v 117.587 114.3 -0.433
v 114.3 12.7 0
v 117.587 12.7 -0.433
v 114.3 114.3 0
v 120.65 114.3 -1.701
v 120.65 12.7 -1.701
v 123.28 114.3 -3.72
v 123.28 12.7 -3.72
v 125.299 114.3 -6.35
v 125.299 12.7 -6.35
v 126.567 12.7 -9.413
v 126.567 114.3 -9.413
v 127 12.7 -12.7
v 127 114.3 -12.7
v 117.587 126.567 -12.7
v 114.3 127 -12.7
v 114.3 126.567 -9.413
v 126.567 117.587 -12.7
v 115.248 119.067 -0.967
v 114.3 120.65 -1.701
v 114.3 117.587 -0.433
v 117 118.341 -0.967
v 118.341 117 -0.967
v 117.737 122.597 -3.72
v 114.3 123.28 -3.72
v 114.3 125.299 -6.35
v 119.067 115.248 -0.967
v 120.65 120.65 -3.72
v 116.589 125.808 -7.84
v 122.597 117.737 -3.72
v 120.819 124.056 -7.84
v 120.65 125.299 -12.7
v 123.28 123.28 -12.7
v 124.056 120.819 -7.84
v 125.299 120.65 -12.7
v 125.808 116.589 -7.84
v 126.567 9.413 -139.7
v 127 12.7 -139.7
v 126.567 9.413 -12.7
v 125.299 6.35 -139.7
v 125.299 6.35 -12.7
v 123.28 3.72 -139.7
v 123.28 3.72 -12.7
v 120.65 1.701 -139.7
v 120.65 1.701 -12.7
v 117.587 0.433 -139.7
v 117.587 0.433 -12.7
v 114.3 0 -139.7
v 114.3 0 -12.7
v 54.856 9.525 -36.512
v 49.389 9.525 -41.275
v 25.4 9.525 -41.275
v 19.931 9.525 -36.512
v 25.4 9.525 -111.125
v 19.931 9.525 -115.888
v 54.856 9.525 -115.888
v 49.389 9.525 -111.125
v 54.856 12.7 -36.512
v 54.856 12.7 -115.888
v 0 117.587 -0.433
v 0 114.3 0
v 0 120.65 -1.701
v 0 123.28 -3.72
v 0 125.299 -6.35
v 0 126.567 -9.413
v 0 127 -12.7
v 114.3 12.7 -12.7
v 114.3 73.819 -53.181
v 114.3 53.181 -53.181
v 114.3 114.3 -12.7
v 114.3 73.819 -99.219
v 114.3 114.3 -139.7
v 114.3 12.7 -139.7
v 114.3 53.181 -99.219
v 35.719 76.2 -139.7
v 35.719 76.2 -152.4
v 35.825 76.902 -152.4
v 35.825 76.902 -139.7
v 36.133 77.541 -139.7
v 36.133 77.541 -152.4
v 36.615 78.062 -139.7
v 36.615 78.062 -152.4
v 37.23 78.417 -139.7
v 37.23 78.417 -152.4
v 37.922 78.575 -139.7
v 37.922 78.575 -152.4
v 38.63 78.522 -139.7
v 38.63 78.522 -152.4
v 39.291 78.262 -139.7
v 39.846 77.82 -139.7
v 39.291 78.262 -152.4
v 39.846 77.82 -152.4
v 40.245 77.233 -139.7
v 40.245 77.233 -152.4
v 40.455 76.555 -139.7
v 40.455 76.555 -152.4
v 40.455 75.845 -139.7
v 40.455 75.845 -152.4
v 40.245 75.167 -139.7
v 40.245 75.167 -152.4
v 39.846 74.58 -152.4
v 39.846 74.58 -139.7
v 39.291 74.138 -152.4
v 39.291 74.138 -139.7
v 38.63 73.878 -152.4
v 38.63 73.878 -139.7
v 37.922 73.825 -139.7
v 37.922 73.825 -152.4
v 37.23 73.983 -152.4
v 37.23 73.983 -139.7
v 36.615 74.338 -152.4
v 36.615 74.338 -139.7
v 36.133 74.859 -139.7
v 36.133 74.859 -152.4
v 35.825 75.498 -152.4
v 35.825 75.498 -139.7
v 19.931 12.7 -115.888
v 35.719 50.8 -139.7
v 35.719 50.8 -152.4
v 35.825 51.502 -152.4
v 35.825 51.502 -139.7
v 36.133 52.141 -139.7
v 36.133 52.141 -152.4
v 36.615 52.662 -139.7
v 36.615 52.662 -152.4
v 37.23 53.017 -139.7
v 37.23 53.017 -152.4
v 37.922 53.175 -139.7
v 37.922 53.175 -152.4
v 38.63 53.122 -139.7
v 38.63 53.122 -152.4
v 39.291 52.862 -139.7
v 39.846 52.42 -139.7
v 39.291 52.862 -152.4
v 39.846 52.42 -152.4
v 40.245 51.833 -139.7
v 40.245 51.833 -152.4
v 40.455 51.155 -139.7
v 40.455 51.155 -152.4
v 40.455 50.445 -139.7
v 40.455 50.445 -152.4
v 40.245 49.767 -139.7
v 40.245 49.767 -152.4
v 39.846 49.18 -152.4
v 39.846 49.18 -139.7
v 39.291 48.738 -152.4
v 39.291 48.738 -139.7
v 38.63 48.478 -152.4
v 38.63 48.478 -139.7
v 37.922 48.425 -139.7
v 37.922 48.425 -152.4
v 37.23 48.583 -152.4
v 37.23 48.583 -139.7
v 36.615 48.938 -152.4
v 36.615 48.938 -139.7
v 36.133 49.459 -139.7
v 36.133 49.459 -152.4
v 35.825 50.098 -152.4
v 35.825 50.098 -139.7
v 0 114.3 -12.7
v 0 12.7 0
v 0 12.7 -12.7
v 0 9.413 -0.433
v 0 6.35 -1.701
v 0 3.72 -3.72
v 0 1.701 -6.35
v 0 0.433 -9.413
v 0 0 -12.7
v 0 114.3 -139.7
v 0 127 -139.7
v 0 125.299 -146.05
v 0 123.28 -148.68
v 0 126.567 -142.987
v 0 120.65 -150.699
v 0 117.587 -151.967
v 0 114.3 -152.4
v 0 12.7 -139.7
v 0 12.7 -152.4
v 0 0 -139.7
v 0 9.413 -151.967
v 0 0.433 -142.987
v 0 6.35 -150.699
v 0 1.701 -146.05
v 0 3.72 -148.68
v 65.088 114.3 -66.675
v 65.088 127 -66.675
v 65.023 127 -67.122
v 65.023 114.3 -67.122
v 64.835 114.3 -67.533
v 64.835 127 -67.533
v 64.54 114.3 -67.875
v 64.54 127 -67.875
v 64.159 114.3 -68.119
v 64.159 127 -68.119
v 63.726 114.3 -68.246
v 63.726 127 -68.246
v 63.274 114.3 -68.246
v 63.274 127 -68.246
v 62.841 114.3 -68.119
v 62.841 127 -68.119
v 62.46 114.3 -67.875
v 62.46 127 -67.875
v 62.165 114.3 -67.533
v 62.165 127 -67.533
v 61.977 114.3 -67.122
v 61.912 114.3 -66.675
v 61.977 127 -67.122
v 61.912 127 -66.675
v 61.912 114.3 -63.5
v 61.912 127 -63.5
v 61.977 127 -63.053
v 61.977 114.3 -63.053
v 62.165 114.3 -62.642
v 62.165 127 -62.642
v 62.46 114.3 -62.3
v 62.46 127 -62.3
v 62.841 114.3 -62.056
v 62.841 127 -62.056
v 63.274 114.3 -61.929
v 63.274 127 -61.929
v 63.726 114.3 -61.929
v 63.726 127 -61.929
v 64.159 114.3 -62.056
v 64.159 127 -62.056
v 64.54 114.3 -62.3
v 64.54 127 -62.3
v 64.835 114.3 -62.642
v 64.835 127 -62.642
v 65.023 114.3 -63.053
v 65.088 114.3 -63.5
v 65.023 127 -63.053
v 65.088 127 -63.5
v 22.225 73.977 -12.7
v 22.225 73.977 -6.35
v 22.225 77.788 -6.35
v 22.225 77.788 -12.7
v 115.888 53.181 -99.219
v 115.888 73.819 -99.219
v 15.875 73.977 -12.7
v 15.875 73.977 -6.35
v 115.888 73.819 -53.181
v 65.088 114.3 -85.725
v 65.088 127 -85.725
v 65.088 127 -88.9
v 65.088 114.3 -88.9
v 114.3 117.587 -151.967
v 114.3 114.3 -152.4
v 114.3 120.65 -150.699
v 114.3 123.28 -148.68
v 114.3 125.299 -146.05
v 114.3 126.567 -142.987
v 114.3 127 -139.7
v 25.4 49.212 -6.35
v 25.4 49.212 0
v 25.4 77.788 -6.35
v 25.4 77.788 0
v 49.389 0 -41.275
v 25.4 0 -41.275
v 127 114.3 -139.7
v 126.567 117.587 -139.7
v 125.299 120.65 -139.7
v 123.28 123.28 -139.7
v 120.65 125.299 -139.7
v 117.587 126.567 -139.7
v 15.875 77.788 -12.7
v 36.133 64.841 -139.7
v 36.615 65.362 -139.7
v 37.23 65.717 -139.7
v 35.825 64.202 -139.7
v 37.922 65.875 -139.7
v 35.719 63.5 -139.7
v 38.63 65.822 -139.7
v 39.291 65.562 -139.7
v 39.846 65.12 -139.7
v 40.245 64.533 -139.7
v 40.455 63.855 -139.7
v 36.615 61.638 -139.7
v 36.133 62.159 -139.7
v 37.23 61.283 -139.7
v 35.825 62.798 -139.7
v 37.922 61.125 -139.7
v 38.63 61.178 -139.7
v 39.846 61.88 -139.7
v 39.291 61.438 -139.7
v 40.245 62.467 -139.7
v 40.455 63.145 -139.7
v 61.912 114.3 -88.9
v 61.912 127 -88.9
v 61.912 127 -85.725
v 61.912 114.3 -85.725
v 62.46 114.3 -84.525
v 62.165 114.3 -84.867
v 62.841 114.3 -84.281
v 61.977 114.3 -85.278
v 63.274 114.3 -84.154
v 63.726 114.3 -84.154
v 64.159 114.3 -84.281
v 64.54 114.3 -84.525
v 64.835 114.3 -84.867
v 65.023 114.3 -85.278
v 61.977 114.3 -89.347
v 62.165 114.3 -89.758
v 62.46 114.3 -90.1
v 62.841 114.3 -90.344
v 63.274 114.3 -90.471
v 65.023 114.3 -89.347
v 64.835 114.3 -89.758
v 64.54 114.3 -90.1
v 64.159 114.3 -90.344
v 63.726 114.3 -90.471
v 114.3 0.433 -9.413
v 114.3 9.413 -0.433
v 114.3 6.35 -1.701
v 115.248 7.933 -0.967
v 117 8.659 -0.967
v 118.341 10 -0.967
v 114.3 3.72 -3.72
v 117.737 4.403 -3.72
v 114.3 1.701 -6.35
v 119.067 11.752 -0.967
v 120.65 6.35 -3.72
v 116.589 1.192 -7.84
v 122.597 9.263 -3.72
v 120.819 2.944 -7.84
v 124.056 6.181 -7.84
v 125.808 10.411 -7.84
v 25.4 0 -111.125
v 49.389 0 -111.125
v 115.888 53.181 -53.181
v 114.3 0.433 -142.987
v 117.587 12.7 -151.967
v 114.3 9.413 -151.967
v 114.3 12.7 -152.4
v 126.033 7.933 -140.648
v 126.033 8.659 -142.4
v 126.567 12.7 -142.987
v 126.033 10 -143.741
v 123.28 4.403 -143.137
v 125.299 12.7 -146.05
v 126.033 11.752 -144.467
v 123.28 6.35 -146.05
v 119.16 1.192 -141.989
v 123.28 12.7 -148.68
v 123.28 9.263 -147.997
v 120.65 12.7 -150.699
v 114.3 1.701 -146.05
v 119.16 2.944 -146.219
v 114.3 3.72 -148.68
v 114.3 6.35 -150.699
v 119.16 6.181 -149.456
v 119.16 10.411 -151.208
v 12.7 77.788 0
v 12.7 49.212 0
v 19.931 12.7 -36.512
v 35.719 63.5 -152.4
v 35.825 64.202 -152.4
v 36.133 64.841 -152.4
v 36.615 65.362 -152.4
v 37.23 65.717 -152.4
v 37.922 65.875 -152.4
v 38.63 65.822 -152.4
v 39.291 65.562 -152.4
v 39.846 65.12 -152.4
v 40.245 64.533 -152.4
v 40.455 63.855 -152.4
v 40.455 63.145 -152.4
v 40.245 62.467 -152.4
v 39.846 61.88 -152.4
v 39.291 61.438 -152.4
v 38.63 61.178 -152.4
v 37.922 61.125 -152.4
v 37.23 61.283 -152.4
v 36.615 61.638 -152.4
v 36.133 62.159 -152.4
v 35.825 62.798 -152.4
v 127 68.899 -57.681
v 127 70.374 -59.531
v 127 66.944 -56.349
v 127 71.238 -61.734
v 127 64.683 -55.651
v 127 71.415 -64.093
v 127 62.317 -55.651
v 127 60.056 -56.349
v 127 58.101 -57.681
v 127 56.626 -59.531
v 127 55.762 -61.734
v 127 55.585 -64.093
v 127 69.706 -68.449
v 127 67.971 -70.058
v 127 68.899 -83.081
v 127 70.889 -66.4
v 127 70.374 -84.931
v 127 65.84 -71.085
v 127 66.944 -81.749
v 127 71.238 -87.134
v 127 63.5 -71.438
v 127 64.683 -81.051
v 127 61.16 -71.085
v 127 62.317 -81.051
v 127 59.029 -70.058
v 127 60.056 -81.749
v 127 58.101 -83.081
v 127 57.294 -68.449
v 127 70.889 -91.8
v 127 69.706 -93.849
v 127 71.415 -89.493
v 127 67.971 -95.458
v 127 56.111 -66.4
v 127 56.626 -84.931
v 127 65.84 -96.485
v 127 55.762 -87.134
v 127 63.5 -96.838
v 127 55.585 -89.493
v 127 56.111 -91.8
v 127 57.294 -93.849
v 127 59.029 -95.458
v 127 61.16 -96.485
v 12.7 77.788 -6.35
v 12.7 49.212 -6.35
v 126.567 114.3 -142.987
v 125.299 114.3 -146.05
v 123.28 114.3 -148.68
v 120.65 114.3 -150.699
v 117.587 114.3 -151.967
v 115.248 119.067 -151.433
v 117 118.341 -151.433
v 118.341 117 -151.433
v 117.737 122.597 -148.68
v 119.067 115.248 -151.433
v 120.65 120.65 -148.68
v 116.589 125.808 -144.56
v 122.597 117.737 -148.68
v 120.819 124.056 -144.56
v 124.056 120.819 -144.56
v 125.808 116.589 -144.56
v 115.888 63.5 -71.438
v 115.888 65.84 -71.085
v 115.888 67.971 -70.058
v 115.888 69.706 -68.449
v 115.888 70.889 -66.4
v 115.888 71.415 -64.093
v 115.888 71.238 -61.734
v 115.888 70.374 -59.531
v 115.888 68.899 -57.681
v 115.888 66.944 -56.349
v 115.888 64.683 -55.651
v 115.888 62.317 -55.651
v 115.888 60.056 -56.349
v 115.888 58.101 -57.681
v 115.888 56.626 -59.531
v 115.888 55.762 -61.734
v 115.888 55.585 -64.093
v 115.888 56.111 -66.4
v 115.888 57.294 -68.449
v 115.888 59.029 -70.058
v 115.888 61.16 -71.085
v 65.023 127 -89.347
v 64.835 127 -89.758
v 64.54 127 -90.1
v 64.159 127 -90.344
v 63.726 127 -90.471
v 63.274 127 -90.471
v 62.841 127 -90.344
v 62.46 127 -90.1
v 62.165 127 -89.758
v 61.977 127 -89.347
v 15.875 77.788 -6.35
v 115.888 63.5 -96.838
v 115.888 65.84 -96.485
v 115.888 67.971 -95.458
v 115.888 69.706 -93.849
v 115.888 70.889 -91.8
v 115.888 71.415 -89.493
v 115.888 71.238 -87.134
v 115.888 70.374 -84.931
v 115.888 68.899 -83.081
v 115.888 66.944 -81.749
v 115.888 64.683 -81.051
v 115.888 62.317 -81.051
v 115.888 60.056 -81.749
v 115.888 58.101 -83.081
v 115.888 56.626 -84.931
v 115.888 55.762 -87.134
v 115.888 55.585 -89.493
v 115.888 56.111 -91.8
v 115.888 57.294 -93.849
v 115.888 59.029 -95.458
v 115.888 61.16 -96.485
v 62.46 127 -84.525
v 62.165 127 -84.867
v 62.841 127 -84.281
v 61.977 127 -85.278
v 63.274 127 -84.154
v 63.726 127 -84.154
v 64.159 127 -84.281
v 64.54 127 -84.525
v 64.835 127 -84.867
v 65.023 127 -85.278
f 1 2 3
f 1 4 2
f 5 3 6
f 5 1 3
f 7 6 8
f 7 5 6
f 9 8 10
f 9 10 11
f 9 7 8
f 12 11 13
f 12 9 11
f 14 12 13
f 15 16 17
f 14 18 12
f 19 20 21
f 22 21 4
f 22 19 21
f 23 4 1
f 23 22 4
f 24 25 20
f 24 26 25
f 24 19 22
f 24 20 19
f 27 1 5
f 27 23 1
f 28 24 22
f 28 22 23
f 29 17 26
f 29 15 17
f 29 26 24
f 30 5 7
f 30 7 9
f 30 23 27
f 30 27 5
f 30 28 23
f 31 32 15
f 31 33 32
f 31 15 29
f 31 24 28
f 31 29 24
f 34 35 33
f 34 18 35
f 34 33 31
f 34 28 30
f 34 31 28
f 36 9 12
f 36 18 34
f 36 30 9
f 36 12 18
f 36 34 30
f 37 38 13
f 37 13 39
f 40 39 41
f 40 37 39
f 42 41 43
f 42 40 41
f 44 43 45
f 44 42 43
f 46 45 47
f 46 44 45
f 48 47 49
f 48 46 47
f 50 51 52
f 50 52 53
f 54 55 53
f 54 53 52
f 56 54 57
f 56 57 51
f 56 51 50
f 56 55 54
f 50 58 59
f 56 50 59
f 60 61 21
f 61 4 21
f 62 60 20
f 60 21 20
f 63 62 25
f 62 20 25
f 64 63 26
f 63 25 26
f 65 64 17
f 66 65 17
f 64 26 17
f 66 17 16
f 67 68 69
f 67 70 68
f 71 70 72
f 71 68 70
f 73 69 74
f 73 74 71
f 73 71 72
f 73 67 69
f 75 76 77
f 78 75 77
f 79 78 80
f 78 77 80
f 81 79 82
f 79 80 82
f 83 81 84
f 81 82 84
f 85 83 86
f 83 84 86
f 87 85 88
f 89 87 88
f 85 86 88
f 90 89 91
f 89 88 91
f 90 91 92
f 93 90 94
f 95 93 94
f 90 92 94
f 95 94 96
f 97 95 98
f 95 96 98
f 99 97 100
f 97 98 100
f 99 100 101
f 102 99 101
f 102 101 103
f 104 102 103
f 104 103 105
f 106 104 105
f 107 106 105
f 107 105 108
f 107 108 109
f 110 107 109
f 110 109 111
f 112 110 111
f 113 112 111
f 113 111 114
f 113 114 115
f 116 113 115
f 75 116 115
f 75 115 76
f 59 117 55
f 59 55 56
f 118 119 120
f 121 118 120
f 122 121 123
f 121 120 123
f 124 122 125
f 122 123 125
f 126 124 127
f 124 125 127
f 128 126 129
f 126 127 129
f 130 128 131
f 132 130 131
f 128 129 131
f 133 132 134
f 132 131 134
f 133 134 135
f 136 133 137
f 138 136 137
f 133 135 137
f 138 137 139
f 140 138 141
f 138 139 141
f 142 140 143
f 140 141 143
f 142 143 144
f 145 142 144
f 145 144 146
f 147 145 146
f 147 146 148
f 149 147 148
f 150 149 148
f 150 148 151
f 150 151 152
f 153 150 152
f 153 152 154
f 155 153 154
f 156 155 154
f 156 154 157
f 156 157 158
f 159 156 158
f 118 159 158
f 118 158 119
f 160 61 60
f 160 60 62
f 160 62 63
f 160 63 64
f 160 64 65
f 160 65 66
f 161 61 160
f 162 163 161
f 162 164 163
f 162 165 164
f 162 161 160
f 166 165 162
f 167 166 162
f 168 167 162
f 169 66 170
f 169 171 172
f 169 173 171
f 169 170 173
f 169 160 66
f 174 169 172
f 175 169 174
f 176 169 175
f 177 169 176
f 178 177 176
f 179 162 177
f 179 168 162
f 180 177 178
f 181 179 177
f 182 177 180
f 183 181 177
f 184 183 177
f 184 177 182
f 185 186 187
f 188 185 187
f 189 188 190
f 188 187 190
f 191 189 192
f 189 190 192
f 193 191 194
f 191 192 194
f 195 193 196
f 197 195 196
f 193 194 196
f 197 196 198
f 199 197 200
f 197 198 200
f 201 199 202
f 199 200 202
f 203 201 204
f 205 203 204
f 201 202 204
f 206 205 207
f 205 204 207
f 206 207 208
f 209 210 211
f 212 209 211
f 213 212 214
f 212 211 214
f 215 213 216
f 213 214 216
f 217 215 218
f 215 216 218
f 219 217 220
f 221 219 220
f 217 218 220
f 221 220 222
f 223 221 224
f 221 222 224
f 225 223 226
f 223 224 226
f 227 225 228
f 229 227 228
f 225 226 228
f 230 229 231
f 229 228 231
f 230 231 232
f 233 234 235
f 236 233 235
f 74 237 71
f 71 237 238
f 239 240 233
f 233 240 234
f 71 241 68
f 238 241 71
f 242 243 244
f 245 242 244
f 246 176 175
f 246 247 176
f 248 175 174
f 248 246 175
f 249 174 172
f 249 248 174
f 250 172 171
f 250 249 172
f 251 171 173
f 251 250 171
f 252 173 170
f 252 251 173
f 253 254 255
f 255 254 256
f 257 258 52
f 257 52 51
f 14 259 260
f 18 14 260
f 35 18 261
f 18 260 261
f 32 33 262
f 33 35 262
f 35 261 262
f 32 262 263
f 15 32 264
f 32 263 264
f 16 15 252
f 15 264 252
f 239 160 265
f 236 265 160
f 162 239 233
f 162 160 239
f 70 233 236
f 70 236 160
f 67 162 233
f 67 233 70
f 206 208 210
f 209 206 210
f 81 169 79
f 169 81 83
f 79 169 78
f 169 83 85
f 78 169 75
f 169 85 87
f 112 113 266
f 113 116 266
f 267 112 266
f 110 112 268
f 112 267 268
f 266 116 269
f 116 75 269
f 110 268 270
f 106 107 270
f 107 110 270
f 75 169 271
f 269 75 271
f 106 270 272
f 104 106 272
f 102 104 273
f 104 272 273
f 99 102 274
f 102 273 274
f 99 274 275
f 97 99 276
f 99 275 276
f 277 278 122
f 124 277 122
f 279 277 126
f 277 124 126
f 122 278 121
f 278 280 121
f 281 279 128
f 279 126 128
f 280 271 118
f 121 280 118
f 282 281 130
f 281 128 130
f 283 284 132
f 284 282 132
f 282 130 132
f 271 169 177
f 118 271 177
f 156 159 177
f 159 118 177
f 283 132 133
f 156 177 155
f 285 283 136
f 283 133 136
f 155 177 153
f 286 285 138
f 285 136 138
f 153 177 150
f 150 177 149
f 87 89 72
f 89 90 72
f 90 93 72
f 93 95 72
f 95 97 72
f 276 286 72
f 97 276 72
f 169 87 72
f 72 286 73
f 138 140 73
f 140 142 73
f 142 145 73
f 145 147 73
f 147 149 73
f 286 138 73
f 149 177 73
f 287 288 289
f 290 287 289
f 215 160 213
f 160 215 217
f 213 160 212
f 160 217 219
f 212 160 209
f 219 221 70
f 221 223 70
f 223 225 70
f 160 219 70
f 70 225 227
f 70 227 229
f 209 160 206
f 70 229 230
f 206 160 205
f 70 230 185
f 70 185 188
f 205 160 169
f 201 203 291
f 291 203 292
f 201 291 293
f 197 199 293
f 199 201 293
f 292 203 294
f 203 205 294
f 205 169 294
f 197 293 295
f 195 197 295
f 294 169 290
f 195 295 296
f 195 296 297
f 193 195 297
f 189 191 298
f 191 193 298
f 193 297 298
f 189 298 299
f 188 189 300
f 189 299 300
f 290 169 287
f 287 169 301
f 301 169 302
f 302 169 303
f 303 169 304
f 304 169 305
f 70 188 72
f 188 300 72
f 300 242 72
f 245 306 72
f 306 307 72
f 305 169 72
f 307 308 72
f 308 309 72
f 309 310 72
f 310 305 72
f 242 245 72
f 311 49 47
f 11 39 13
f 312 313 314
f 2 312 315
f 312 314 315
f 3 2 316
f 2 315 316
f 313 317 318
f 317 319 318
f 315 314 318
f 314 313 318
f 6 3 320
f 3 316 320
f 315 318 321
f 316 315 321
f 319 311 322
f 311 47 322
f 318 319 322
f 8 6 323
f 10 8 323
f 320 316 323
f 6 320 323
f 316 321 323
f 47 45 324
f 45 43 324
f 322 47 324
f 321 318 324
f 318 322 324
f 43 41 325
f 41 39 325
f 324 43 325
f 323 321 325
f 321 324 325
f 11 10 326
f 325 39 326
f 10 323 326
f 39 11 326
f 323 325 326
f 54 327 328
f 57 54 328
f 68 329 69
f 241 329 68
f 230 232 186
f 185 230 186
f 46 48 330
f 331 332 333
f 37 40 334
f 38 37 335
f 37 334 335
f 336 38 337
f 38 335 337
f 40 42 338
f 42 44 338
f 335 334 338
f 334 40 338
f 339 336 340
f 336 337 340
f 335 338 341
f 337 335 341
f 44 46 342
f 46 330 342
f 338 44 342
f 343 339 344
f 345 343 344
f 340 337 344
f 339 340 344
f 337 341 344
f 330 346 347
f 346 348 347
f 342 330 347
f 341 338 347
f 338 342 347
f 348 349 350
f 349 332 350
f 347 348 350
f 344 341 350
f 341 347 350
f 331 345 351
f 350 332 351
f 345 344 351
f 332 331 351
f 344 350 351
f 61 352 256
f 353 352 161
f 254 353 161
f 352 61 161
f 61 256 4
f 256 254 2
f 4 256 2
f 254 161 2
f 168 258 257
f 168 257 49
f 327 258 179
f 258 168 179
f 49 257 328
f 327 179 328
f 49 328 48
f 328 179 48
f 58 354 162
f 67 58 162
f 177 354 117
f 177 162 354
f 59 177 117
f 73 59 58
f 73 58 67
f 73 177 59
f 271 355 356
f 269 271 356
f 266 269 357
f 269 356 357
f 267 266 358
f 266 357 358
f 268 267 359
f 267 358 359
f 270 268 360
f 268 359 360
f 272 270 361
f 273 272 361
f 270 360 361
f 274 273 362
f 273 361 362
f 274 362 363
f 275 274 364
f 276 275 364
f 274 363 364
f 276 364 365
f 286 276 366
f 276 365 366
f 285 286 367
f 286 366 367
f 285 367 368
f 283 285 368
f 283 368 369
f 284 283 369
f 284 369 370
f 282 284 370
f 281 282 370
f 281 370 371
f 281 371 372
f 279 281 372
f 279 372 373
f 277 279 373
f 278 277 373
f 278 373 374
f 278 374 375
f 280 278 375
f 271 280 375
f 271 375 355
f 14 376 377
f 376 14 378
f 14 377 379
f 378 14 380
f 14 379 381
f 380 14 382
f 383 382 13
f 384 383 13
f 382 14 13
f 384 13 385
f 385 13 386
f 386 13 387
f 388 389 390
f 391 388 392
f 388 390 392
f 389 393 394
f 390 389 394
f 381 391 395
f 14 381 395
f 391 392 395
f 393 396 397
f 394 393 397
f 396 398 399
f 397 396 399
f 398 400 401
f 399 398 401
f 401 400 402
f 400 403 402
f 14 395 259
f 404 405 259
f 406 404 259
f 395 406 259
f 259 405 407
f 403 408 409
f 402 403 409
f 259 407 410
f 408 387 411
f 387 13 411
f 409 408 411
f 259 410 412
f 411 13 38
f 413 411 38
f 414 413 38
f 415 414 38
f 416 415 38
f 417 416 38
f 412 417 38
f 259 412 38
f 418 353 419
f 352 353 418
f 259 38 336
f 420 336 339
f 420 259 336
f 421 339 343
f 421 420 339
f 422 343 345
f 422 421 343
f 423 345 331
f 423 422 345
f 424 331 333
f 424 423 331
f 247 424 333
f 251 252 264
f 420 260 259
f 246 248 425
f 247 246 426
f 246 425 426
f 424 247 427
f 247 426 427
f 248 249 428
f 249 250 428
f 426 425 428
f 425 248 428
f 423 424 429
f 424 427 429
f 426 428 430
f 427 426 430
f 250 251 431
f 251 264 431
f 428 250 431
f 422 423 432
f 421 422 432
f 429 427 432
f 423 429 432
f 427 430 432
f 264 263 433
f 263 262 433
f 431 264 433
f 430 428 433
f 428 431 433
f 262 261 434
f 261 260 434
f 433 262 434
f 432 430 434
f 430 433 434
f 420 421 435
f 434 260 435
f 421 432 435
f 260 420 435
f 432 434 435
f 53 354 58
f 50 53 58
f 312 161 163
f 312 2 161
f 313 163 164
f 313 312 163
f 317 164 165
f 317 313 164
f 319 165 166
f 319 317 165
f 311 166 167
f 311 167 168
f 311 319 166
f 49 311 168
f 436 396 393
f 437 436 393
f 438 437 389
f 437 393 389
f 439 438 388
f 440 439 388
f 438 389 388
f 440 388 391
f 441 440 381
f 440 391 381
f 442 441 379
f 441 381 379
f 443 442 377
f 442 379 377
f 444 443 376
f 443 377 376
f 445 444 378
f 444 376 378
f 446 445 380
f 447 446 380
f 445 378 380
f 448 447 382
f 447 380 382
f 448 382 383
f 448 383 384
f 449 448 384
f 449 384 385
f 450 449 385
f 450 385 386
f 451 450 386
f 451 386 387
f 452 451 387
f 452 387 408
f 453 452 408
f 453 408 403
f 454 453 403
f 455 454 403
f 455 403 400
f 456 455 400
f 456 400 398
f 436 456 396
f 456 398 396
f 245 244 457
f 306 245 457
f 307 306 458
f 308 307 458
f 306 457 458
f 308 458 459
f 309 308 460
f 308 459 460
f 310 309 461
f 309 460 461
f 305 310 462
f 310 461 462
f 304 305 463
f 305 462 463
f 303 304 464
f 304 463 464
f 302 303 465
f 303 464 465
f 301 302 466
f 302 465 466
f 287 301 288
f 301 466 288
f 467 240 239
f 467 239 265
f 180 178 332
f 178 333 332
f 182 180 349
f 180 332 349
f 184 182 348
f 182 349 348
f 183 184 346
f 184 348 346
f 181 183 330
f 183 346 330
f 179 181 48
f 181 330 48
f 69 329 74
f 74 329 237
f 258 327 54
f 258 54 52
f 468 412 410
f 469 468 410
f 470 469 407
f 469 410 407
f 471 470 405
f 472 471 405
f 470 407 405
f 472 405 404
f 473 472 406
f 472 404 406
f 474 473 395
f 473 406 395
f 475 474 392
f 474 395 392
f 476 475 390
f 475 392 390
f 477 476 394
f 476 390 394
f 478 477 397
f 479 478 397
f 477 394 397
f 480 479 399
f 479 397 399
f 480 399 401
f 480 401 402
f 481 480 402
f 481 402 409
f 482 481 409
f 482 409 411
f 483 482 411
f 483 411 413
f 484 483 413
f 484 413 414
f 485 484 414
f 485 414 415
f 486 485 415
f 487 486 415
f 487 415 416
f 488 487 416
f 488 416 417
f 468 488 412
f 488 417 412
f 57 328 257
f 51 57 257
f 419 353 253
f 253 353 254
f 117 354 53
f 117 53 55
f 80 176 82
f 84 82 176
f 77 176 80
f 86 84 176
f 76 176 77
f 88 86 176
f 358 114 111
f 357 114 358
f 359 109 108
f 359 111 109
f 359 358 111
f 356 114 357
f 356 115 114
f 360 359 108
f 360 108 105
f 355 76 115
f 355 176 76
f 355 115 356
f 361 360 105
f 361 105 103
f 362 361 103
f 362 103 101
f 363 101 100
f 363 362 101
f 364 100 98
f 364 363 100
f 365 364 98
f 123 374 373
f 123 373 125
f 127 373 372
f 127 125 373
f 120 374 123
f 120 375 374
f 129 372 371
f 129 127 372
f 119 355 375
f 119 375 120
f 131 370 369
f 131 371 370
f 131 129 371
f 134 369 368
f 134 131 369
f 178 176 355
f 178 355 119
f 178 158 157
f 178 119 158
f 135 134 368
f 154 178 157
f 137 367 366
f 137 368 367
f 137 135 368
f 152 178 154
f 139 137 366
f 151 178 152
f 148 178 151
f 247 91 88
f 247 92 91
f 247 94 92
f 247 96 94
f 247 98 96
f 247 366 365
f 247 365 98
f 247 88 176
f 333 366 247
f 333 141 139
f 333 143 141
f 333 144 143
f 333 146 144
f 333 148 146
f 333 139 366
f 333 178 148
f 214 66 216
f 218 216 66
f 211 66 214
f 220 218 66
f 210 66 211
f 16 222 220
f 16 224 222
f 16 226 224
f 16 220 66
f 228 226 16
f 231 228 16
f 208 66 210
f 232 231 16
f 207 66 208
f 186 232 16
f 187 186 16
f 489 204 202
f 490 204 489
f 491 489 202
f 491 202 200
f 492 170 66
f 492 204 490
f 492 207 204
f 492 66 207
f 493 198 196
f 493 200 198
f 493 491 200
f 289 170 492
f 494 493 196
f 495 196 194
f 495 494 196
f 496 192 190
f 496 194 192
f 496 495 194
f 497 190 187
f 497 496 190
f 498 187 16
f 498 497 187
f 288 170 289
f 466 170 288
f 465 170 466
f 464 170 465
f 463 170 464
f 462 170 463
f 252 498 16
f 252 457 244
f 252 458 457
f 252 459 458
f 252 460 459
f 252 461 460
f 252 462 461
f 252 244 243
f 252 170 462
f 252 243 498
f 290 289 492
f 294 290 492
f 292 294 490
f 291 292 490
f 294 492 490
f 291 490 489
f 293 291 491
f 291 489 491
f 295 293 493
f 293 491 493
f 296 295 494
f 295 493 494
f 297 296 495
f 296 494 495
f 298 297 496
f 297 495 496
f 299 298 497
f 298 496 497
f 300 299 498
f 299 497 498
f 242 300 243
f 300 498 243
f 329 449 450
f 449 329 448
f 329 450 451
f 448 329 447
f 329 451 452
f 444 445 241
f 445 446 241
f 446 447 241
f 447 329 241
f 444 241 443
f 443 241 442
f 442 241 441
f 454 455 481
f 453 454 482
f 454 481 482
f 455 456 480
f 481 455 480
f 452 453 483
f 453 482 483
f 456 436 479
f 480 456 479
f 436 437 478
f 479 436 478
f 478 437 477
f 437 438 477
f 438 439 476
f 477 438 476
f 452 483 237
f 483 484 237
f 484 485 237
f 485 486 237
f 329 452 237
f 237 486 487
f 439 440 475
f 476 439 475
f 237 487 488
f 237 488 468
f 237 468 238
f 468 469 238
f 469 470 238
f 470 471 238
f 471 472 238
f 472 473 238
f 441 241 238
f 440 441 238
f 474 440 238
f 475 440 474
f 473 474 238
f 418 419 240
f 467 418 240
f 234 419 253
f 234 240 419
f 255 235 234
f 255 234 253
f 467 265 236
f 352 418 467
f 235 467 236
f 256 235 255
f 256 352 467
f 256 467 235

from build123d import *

# Parameters (mm, degrees)
SKETCH1_W           = 127
SKETCH1_H           = 152.4
BOSS_EXTRUDE1_DEPTH = 127
SHELL1_T            = -12.7
FILLET1_R           = 12.7
SKETCH3_W           = 23.988888889
SKETCH3_H           = 69.85
CUT_EXTRUDE1_DEPTH  = 9.525
SKETCH4_W           = 34.925
SKETCH4_H           = 79.375
CUT_EXTRUDE2_DEPTH  = 3.175
SKETCH5_W           = 12.7
SKETCH5_H           = 28.575
CUT_EXTRUDE3_DEPTH  = 6.35
CUT_EXTRUDE4_REACH  = 233.492
SKETCH6_W           = 6.35
SKETCH6_H           = 3.81
SKETCH7_R           = 7.9375
CUT_EXTRUDE5_DEPTH  = 11.1125
CUT_EXTRUDE6_REACH  = 231.749
SKETCH8_W           = 46.0375
SKETCH8_H           = 20.6375
CUT_EXTRUDE7_REACH  = 237.55
SKETCH9_R           = 2.38125
CUT_EXTRUDE8_REACH  = 237.55


with BuildPart() as part:
    # Sketch1 → Boss-Extrude1 (new body)
    with BuildSketch(Plane(origin=(0, 0, 0), x_dir=(1, 0, 0), z_dir=(0, 1, 0))):
        with Locations((63.5, 76.2)):
            Rectangle(SKETCH1_W, SKETCH1_H)
    extrude(amount=BOSS_EXTRUDE1_DEPTH)

    # Shell1
    shell1_openings = [part.faces().sort_by_distance(p)[0] for p in [
        (0, 63.5, -76.2),
    ]]
    offset(amount=SHELL1_T, openings=shell1_openings, kind=Kind.INTERSECTION)

    # Fillet1
    fillet1_edges = [part.edges().sort_by_distance(p)[0] for p in [
        (127, 127, -76.2),
        (63.5, 127, -152.4),
        (63.5, 0, -152.4),
        (127, 0, -76.2),
        (63.5, 0, 0),
        (63.5, 127, 0),
        (127, 63.5, -152.4),
        (127, 63.5, 0),
    ]]
    fillet(fillet1_edges, radius=FILLET1_R)

    # Sketch3 → Cut-Extrude1 (cut)
    with BuildSketch(Plane.XZ):
        with Locations((37.394444445, -76.2)):
            Rectangle(SKETCH3_W, SKETCH3_H)
    extrude(amount=-CUT_EXTRUDE1_DEPTH, mode=Mode.SUBTRACT)

    # Sketch4 → Cut-Extrude2 (cut)
    with BuildSketch(Plane(origin=(0, 12.7, 0), x_dir=(1, 0, 0), z_dir=(0, 1, 0))):
        with Locations((37.39388, 76.2)):
            Rectangle(SKETCH4_W, SKETCH4_H)
    extrude(amount=-CUT_EXTRUDE2_DEPTH, mode=Mode.SUBTRACT)

    # Sketch5 → Cut-Extrude3 (cut)
    with BuildSketch(Plane.XY):
        with Locations((19.05, 63.5)):
            Rectangle(SKETCH5_W, SKETCH5_H)
    extrude(amount=-CUT_EXTRUDE3_DEPTH, mode=Mode.SUBTRACT)

    # Sketch6 → Cut-Extrude4 (cut, up to next)
    with BuildSketch(Plane.XY.offset(-6.35), mode=Mode.PRIVATE) as cut_extrude4_sk1:
        with Locations((19.05, 75.8825)):
            Rectangle(SKETCH6_W, SKETCH6_H)
    cut_extrude4_tool1 = extrude(cut_extrude4_sk1.sketch, amount=-CUT_EXTRUDE4_REACH, mode=Mode.PRIVATE) & part.part
    add(cut_extrude4_tool1.solids().sort_by_distance((19.05, 75.8825, -6.35))[0], mode=Mode.SUBTRACT)

    # Sketch7 → Cut-Extrude5 (cut)
    with BuildSketch(Plane(origin=(127, 0, 0), x_dir=(0, 0, -1), z_dir=(1, 0, 0))):
        with Locations((63.5, 63.5)):
            Circle(SKETCH7_R)
        with Locations((88.9, 63.5)):
            Circle(SKETCH7_R)
    extrude(amount=-CUT_EXTRUDE5_DEPTH, mode=Mode.SUBTRACT)

    # Sketch8 → Cut-Extrude6 (cut, up to next)
    with BuildSketch(Plane(origin=(115.8875, 0, 0), x_dir=(0, 0, -1), z_dir=(1, 0, 0)), mode=Mode.PRIVATE) as cut_extrude6_sk1:
        with Locations((76.2, 63.5)):
            Rectangle(SKETCH8_W, SKETCH8_H)
    cut_extrude6_tool1 = extrude(cut_extrude6_sk1.sketch, amount=-CUT_EXTRUDE6_REACH, mode=Mode.PRIVATE) & part.part
    add(cut_extrude6_tool1.solids().sort_by_distance((115.8875, 63.5, -76.2))[0], mode=Mode.SUBTRACT)

    # Sketch9 → Cut-Extrude7 (cut, up to next)
    with BuildSketch(Plane(origin=(0, 0, -152.4), x_dir=(-1, 0, 0), z_dir=(0, 0, -1)), mode=Mode.PRIVATE) as cut_extrude7_sk1:
        with Locations((-38.1, 76.2)):
            Circle(SKETCH9_R)
    cut_extrude7_tool1 = extrude(cut_extrude7_sk1.sketch, amount=-CUT_EXTRUDE7_REACH, mode=Mode.PRIVATE) & part.part
    # Sketch9 → Cut-Extrude7 (cut, up to next)
    with BuildSketch(Plane(origin=(0, 0, -152.4), x_dir=(-1, 0, 0), z_dir=(0, 0, -1)), mode=Mode.PRIVATE) as cut_extrude7_sk2:
        with Locations((-38.1, 63.5)):
            Circle(SKETCH9_R)
    cut_extrude7_tool2 = extrude(cut_extrude7_sk2.sketch, amount=-CUT_EXTRUDE7_REACH, mode=Mode.PRIVATE) & part.part
    # Sketch9 → Cut-Extrude7 (cut, up to next)
    with BuildSketch(Plane(origin=(0, 0, -152.4), x_dir=(-1, 0, 0), z_dir=(0, 0, -1)), mode=Mode.PRIVATE) as cut_extrude7_sk3:
        with Locations((-38.1, 50.8)):
            Circle(SKETCH9_R)
    cut_extrude7_tool3 = extrude(cut_extrude7_sk3.sketch, amount=-CUT_EXTRUDE7_REACH, mode=Mode.PRIVATE) & part.part
    add(cut_extrude7_tool1.solids().sort_by_distance((38.1, 76.2, -152.4))[0], mode=Mode.SUBTRACT)
    add(cut_extrude7_tool2.solids().sort_by_distance((38.1, 63.5, -152.4))[0], mode=Mode.SUBTRACT)
    add(cut_extrude7_tool3.solids().sort_by_distance((38.1, 50.8, -152.4))[0], mode=Mode.SUBTRACT)

    # Sketch10 → Cut-Extrude8 (cut, up to next)
    with BuildSketch(Plane(origin=(0, 127, 0), x_dir=(1, 0, 0), z_dir=(0, 1, 0)), mode=Mode.PRIVATE) as cut_extrude8_sk1:
        with BuildLine():
            Line((61.9125, 88.9), (61.9125, 85.725))
            ThreePointArc((61.9125, 85.725), (63.5, 84.1375), (65.0875, 85.725))
            Line((65.0875, 85.725), (65.0875, 88.9))
            ThreePointArc((65.0875, 88.9), (63.5, 90.4875), (61.9125, 88.9))
        make_face()
    cut_extrude8_tool1 = extrude(cut_extrude8_sk1.sketch, amount=-CUT_EXTRUDE8_REACH, mode=Mode.PRIVATE) & part.part
    # Sketch10 → Cut-Extrude8 (cut, up to next)
    with BuildSketch(Plane(origin=(0, 127, 0), x_dir=(1, 0, 0), z_dir=(0, 1, 0)), mode=Mode.PRIVATE) as cut_extrude8_sk2:
        with BuildLine():
            Line((61.9125, 66.675), (61.9125, 63.5))
            ThreePointArc((61.9125, 63.5), (63.5, 61.9125), (65.0875, 63.5))
            Line((65.0875, 63.5), (65.0875, 66.675))
            ThreePointArc((65.0875, 66.675), (63.5, 68.2625), (61.9125, 66.675))
        make_face()
    cut_extrude8_tool2 = extrude(cut_extrude8_sk2.sketch, amount=-CUT_EXTRUDE8_REACH, mode=Mode.PRIVATE) & part.part
    add(cut_extrude8_tool1.solids().sort_by_distance((63.5, 127, -87.3125))[0], mode=Mode.SUBTRACT)
    add(cut_extrude8_tool2.solids().sort_by_distance((63.5, 127, -65.0875))[0], mode=Mode.SUBTRACT)


solid = part.part
